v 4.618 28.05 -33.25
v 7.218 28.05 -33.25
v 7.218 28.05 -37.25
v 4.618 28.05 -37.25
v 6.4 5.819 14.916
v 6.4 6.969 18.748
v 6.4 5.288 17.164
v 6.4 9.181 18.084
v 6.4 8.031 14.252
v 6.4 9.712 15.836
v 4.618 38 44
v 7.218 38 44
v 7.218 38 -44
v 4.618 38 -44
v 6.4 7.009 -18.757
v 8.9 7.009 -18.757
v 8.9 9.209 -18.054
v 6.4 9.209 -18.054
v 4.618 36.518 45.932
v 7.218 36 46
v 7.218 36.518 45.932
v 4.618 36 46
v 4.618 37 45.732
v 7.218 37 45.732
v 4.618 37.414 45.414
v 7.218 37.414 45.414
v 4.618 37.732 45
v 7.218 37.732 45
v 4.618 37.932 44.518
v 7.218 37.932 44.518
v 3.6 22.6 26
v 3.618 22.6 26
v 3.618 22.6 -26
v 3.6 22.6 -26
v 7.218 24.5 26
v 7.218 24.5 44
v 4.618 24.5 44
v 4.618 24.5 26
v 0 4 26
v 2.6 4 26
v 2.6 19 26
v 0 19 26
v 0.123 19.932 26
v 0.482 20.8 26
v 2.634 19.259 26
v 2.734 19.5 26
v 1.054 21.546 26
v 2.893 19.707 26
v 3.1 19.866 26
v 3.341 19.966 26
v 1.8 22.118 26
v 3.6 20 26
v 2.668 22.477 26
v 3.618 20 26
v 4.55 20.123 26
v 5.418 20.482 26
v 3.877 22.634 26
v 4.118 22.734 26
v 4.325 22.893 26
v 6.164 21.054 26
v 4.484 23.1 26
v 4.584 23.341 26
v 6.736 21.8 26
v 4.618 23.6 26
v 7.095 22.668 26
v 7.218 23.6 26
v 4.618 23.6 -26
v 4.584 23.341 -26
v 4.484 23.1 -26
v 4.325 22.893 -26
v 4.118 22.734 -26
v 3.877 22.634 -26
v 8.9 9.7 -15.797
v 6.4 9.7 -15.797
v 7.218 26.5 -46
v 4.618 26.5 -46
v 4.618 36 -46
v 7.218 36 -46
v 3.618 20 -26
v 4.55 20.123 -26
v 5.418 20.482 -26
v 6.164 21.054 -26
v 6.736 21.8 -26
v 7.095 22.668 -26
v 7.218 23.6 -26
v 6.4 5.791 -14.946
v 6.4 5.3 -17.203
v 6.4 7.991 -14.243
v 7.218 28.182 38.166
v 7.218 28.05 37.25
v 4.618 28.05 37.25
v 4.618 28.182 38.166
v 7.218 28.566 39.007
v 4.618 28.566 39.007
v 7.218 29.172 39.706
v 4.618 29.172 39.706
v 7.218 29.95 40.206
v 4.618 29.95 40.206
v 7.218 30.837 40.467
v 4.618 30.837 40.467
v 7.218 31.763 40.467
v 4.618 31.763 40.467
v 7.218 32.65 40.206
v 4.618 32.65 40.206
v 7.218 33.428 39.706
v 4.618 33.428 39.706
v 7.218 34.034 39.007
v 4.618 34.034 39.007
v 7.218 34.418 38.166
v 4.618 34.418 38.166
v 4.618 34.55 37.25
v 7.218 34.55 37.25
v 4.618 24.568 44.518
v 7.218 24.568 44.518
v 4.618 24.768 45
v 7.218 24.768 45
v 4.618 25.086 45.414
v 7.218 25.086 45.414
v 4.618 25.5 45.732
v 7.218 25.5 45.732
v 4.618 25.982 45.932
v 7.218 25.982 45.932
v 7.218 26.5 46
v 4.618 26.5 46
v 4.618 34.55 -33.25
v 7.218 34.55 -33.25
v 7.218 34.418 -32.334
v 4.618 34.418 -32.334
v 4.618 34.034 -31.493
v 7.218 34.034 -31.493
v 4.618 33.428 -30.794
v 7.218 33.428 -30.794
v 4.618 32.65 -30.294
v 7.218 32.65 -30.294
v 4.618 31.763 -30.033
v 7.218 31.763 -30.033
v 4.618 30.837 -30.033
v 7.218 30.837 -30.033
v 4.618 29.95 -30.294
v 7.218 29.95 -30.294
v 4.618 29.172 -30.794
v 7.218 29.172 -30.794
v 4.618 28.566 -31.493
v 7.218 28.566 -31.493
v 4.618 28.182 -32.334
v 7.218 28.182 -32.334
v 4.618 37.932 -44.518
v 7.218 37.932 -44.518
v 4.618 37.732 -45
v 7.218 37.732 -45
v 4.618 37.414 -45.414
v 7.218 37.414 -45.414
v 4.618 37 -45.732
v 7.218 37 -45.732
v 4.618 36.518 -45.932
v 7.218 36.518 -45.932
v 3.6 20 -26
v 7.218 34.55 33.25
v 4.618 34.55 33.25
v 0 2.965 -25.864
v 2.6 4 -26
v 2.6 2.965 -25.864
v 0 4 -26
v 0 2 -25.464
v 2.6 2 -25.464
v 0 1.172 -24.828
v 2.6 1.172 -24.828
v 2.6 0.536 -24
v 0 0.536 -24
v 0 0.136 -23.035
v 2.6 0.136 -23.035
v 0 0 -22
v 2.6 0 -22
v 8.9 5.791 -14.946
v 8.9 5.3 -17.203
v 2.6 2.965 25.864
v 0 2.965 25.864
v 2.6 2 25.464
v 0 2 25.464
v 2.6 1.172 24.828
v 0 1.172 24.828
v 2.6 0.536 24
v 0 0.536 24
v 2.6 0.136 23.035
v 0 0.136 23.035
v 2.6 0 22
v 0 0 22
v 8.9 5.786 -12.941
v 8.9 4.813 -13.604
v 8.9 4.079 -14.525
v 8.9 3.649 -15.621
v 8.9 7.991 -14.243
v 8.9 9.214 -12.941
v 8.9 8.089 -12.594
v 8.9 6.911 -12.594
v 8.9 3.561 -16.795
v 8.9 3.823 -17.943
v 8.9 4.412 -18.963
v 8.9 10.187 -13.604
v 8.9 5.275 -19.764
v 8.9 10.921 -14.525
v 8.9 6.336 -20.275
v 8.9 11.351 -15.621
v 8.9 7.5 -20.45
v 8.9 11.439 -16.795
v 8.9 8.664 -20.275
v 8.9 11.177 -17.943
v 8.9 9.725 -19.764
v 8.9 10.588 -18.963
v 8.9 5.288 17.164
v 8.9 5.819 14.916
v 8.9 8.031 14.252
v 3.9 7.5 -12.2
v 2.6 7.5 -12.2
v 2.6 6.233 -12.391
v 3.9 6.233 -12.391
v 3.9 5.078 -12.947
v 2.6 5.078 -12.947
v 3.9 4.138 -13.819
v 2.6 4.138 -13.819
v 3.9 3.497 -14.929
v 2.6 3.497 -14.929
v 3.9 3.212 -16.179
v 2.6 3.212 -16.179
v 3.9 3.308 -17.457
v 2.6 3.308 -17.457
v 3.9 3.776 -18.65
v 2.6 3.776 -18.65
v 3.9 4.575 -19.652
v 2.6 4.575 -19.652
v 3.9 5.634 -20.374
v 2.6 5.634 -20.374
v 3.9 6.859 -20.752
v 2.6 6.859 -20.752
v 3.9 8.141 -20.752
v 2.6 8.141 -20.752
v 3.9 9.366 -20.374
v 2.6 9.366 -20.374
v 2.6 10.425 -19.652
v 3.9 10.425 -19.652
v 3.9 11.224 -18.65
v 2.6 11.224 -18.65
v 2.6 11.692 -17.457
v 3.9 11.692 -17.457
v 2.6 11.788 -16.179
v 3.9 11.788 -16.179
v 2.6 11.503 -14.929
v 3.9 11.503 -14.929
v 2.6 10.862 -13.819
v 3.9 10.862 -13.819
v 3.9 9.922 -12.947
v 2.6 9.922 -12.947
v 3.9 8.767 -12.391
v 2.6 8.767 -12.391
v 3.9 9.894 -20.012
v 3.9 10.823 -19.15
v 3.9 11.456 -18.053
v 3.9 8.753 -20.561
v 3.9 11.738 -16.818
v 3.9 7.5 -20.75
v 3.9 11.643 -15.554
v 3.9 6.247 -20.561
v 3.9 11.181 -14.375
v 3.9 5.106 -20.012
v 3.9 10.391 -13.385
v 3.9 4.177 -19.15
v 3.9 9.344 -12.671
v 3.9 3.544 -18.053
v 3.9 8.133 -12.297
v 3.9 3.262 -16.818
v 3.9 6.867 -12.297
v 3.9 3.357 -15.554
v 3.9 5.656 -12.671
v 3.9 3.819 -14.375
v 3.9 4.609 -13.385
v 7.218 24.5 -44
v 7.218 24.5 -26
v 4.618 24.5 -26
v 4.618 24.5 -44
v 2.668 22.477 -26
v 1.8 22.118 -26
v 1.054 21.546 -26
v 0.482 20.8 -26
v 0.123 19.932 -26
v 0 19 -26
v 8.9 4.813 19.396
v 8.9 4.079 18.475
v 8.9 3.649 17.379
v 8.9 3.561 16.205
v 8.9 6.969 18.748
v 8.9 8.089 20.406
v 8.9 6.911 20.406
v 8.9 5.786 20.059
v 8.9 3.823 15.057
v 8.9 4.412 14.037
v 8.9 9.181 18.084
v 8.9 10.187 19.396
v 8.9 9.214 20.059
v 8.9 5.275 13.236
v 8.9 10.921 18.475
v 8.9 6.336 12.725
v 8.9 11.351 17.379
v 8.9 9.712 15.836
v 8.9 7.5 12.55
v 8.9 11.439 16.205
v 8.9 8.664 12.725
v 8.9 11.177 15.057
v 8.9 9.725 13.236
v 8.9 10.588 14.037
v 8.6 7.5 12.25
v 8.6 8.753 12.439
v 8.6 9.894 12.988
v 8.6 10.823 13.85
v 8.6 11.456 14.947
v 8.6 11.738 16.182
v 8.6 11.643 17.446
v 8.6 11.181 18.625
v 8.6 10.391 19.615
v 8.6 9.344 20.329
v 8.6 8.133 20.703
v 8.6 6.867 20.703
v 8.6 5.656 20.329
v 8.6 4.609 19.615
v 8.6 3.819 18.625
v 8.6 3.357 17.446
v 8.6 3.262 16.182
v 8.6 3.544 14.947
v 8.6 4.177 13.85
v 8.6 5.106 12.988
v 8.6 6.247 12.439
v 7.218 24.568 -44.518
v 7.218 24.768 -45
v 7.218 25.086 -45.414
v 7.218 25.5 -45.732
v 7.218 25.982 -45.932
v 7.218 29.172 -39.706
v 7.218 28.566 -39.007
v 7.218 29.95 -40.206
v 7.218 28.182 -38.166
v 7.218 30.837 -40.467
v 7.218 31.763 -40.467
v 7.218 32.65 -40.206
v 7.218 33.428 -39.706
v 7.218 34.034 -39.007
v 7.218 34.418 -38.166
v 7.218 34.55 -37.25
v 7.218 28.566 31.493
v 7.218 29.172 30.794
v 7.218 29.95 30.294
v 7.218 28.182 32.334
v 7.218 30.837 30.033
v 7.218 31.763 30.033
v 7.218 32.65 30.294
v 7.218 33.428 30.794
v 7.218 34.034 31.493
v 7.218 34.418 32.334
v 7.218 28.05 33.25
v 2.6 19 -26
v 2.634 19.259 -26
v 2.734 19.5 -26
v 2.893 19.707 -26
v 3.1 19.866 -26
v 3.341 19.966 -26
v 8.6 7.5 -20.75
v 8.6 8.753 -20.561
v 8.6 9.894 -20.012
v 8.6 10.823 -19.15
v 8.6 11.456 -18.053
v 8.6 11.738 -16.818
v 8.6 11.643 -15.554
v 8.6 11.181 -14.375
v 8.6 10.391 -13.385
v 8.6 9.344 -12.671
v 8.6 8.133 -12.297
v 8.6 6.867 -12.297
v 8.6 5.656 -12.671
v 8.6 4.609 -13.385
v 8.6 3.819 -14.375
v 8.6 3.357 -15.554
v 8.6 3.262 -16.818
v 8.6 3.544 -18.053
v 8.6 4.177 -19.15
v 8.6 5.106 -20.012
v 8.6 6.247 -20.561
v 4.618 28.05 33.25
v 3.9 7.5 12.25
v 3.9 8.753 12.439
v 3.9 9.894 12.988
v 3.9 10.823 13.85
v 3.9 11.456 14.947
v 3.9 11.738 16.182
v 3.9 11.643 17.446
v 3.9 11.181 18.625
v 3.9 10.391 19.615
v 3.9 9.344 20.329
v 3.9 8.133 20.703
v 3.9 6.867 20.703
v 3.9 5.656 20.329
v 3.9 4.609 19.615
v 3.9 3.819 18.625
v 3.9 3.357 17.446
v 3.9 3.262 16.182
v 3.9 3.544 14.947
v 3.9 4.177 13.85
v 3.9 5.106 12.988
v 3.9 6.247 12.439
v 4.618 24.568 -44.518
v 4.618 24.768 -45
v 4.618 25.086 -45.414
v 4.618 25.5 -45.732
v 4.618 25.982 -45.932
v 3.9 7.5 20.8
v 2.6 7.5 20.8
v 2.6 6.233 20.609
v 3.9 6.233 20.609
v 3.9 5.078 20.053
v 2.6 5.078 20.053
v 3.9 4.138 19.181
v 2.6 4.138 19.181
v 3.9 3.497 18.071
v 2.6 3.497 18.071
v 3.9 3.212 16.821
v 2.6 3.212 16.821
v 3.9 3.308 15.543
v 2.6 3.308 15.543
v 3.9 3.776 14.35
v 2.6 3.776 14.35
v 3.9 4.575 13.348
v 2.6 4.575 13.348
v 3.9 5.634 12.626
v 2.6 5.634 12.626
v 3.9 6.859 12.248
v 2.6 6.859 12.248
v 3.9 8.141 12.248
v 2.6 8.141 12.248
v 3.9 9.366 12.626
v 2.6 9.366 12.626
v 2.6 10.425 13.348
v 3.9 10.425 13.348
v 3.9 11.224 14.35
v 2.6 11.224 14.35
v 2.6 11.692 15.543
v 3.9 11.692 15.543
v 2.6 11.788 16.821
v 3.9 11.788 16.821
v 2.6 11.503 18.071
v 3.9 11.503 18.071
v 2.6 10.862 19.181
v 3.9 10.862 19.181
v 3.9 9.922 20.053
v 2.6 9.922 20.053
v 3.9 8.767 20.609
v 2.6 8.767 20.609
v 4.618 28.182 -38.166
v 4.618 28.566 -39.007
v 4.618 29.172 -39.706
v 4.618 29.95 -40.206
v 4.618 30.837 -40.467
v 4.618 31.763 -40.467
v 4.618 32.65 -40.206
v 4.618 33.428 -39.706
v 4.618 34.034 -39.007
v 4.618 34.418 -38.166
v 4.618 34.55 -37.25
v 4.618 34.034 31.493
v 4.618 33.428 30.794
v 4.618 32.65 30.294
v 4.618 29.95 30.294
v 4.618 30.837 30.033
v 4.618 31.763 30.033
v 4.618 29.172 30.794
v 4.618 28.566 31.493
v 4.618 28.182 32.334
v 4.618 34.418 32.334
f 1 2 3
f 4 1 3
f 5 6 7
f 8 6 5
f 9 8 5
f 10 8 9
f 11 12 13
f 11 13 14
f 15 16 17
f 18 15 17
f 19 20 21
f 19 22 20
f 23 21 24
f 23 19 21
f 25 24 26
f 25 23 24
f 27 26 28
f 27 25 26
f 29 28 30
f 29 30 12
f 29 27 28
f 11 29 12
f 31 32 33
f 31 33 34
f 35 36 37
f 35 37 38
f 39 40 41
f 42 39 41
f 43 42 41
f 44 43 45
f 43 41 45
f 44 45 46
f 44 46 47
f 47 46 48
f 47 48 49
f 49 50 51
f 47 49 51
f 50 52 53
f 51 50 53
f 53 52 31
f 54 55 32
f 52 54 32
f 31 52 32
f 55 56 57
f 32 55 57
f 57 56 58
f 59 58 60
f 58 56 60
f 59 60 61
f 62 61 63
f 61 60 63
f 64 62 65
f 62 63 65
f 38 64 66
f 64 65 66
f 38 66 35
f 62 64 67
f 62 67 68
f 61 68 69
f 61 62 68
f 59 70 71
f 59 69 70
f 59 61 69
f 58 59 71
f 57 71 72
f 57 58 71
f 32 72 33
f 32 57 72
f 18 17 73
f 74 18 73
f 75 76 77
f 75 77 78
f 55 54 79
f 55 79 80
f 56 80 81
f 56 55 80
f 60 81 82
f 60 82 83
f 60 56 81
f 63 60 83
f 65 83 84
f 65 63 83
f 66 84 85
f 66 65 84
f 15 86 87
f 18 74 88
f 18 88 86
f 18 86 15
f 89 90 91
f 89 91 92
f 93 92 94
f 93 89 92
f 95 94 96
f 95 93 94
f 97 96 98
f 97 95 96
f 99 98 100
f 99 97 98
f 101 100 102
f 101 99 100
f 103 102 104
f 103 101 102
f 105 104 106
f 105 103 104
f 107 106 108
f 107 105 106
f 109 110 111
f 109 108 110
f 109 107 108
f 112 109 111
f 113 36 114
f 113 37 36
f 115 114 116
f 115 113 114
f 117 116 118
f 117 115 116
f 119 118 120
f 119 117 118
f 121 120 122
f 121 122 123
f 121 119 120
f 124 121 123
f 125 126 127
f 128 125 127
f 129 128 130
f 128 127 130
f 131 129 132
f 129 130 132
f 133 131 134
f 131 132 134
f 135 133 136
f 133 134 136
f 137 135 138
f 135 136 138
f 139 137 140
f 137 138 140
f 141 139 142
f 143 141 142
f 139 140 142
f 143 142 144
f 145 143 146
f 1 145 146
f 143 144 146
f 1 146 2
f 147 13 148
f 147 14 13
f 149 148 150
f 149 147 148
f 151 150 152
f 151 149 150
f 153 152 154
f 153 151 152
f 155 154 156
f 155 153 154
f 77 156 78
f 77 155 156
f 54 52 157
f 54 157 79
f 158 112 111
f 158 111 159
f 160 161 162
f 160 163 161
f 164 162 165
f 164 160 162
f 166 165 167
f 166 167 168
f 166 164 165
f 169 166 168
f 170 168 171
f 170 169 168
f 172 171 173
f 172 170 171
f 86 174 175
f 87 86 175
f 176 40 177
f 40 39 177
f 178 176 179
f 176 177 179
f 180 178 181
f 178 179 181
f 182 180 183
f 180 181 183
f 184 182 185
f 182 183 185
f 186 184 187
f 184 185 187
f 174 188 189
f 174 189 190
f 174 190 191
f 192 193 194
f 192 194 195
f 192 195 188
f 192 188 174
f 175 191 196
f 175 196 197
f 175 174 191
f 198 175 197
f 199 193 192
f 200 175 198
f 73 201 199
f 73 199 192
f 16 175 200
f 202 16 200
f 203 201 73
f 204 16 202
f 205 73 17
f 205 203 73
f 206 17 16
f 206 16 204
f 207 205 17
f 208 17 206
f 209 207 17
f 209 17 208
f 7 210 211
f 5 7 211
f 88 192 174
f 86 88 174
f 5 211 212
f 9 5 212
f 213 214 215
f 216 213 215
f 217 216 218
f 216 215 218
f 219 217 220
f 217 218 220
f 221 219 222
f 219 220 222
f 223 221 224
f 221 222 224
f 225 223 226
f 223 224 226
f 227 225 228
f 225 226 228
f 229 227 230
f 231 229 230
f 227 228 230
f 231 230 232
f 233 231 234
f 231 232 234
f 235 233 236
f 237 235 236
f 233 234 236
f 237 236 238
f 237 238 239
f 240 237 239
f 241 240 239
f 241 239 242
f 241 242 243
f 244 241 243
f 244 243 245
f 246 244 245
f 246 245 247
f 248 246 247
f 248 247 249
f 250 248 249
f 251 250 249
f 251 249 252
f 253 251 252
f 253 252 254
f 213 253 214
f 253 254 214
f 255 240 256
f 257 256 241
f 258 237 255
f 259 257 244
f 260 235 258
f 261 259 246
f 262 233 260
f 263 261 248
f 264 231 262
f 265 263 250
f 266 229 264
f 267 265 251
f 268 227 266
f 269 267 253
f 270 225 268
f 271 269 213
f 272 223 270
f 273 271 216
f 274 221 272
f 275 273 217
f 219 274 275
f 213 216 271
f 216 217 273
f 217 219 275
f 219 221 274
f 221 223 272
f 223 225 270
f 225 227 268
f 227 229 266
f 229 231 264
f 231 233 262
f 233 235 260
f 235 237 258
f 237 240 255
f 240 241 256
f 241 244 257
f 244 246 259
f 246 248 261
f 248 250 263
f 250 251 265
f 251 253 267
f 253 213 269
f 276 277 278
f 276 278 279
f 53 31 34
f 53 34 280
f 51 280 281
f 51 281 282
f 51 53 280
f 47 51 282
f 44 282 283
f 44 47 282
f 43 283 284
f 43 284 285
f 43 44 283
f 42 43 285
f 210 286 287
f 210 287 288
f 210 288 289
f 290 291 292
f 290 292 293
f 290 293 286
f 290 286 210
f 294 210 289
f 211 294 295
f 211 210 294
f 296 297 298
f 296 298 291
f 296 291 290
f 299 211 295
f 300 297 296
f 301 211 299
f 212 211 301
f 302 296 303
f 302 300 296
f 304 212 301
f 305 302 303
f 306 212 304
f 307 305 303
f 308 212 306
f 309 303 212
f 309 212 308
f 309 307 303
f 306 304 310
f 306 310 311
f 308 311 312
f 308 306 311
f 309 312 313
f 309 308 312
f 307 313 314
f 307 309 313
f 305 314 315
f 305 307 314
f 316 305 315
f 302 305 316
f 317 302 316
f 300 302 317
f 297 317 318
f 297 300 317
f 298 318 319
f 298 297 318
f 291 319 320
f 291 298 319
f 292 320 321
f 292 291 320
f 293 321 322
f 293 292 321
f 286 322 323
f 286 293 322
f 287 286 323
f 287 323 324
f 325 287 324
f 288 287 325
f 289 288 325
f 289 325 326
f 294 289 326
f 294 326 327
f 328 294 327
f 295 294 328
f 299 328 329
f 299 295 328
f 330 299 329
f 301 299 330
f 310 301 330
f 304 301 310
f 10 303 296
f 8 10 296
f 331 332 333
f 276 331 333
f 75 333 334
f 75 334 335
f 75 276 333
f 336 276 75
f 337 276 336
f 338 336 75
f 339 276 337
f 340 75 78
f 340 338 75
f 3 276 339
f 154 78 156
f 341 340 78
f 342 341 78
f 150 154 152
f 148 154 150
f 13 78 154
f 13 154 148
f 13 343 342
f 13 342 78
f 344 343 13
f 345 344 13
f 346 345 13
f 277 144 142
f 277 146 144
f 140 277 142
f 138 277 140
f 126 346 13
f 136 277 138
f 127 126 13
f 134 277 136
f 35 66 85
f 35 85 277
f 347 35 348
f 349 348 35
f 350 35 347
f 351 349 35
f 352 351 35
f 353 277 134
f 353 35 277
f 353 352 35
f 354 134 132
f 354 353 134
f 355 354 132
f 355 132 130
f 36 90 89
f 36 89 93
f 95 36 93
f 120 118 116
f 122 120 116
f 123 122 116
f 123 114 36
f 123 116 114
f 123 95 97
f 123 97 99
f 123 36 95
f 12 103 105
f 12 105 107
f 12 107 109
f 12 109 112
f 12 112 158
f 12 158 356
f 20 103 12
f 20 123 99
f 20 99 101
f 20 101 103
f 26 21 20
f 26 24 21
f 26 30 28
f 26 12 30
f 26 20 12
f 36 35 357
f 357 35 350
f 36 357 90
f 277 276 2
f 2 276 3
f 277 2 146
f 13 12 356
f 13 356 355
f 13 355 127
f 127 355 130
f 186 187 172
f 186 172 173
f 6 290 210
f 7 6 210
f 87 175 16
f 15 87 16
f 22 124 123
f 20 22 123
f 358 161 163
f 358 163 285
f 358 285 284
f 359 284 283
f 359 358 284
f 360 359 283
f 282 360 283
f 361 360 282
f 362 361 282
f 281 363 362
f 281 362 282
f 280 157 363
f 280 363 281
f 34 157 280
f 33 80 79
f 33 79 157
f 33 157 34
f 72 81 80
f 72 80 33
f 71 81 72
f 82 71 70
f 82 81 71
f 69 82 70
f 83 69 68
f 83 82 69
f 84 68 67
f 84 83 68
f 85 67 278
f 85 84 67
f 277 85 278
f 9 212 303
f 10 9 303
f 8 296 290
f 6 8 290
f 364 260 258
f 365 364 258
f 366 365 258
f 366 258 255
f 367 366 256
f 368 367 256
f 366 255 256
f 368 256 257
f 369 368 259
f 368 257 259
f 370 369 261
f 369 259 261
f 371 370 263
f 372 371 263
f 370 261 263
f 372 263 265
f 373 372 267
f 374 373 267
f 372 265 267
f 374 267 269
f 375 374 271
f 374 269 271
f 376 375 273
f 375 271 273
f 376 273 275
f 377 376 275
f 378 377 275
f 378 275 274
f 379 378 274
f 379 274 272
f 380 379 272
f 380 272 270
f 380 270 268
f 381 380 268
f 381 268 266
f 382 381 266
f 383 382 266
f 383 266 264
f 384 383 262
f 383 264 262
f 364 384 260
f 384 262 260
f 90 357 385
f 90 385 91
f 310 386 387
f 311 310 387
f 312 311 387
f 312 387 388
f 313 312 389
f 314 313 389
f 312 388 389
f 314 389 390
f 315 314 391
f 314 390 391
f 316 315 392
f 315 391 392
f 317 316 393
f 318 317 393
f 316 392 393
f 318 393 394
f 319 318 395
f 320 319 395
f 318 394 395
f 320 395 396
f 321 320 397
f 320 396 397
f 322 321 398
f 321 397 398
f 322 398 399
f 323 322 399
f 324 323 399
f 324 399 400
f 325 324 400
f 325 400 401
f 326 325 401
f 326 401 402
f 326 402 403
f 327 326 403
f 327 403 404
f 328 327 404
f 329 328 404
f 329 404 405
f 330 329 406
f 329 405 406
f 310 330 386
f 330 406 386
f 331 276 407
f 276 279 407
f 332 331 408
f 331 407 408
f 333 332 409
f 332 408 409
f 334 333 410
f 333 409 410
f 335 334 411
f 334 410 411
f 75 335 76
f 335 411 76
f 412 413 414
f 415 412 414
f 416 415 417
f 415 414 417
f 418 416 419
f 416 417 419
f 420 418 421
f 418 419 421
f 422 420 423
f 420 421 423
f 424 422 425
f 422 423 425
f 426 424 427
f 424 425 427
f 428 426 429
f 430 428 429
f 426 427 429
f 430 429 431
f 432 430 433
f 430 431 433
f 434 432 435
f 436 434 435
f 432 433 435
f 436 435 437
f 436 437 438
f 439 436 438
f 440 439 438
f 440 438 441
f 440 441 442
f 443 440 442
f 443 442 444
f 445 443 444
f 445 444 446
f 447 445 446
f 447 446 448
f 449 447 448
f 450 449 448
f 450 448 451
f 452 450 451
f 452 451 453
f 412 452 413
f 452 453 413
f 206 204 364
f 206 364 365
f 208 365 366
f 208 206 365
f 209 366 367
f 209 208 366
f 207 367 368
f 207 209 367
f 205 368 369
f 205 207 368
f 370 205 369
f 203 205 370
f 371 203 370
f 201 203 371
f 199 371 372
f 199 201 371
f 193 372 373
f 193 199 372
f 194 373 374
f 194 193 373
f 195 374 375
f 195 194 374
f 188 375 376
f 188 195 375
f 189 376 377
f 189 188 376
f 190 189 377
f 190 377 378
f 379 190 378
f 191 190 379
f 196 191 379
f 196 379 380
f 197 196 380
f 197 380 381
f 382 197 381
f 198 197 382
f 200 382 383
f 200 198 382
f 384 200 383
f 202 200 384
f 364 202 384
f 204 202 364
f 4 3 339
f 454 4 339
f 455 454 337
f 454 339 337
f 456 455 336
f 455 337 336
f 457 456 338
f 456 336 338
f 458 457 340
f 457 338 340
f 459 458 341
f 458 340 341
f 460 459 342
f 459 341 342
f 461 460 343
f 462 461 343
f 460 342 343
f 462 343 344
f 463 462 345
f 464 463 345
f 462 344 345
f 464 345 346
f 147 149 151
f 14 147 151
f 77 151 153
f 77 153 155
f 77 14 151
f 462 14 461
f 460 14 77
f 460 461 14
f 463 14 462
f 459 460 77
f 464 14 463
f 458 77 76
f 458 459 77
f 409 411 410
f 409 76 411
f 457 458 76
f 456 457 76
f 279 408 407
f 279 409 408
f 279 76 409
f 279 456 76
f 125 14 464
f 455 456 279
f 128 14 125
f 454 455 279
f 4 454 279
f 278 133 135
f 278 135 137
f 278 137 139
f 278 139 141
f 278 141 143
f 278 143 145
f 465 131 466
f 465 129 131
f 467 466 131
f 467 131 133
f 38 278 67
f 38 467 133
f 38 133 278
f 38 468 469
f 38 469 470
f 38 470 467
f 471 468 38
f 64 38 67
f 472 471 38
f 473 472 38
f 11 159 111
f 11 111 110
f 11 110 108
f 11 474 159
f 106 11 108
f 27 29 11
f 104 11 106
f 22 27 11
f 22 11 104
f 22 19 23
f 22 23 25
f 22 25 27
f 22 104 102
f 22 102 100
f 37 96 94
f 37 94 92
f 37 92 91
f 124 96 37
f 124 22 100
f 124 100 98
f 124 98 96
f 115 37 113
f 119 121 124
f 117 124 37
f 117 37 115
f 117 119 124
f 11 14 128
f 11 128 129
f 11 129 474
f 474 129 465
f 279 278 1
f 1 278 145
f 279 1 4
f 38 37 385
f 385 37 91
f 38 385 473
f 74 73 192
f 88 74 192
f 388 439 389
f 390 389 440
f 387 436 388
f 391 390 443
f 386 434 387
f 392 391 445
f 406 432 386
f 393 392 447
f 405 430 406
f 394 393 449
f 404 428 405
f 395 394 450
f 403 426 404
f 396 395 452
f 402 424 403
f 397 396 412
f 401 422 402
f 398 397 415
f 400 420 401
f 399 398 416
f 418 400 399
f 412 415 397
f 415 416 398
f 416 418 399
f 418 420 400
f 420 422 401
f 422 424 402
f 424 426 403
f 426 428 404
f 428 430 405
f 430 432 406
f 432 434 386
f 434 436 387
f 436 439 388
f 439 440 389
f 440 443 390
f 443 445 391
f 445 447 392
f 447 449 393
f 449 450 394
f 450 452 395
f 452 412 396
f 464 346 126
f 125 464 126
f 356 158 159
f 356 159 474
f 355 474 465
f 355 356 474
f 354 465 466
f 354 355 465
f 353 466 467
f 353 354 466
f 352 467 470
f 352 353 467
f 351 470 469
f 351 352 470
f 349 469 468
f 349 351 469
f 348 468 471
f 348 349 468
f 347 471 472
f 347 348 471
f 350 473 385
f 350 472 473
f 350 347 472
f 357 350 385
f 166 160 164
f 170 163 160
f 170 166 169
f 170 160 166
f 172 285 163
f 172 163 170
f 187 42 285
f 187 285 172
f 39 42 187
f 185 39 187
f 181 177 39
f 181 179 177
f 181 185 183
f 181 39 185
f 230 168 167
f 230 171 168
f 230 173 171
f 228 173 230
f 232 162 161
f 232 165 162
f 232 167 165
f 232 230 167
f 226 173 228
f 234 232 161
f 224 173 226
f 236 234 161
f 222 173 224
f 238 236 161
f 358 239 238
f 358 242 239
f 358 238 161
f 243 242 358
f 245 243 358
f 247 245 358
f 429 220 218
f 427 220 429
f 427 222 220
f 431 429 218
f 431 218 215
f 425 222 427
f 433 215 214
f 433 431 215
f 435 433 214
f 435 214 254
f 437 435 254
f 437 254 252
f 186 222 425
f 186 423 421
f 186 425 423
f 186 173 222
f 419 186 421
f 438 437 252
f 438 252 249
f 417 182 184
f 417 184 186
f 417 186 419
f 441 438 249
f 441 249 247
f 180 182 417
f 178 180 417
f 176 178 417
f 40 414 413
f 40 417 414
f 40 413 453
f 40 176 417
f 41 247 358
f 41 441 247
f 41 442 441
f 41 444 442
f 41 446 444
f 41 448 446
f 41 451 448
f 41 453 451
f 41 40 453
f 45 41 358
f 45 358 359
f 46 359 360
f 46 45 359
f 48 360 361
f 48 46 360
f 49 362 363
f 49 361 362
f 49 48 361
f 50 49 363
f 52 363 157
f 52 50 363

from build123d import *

# Parameters (mm, degrees)
BOSS_EXTRUDE1_DEPTH = 46
CUT_EXTRUDE1_REACH  = 62.101
SKETCH2_W           = 20
SKETCH2_H           = 24.5
FILLET1_R           = 2
FILLET2_R           = 4
CUT_EXTRUDE2_REACH  = 62.101
SKETCH4_R           = 4.3
BOSS_EXTRUDE2_DEPTH = 1.3
SKETCH5_R           = 4.25
BOSS_EXTRUDE3_DEPTH = 5
CHAMFER1_SIZE       = 0.3
CUT_EXTRUDE3_DEPTH  = 2.5


with BuildPart() as part:
    # Sketch1 → Boss-Extrude1 (new, symmetric)
    with BuildSketch(Plane.XY):
        with BuildLine():
            Line((0, 0), (2.6, 0))
            Line((2.6, 0), (2.6, 19))
            ThreePointArc((2.6, 19), (2.892893219, 19.707106781), (3.6, 20))
            Line((3.6, 20), (3.618034897, 20))
            ThreePointArc((3.618034897, 20), (6.16361931, 21.054415588), (7.218034897, 23.6))
            Line((7.218034897, 23.6), (7.218034897, 38))
            Line((7.218034897, 38), (4.618034897, 38))
            Line((4.618034897, 38), (4.618034897, 23.6))
            ThreePointArc((4.618034897, 23.6), (4.325141678, 22.892893219), (3.618034897, 22.6))
            Line((3.618034897, 22.6), (3.6, 22.6))
            ThreePointArc((3.6, 22.6), (1.054415588, 21.545584412), (0, 19))
            Line((0, 19), (0, 0))
        make_face()
    extrude(amount=BOSS_EXTRUDE1_DEPTH, both=True)

    # Sketch2 → Cut-Extrude1 (cut, up to next)
    with BuildSketch(Plane(origin=(7.218034897, 0, 0), x_dir=(0, 0, -1), z_dir=(1, 0, 0)), mode=Mode.PRIVATE) as cut_extrude1_sk1:
        with Locations((-36, 12.25)):
            Rectangle(SKETCH2_W, SKETCH2_H)
    cut_extrude1_tool1 = extrude(cut_extrude1_sk1.sketch, amount=-CUT_EXTRUDE1_REACH, mode=Mode.PRIVATE) & part.part
    # Sketch2 → Cut-Extrude1 (cut, up to next)
    with BuildSketch(Plane(origin=(7.218034897, 0, 0), x_dir=(0, 0, -1), z_dir=(1, 0, 0)), mode=Mode.PRIVATE) as cut_extrude1_sk2:
        with Locations((36, 12.25)):
            Rectangle(SKETCH2_W, SKETCH2_H)
    cut_extrude1_tool2 = extrude(cut_extrude1_sk2.sketch, amount=-CUT_EXTRUDE1_REACH, mode=Mode.PRIVATE) & part.part
    add(cut_extrude1_tool1.solids().sort_by_distance((7.218035, 12.25, 36))[0], mode=Mode.SUBTRACT)
    add(cut_extrude1_tool2.solids().sort_by_distance((7.218035, 12.25, -36))[0], mode=Mode.SUBTRACT)

    # Fillet1
    fillet1_edges = [part.edges().sort_by_distance(p)[0] for p in [
        (5.918034897, 38, -46),
        (5.918034897, 38, 46),
        (5.918034897, 24.5, 46),
        (5.918034897, 24.5, -46),
    ]]
    fillet(fillet1_edges, radius=FILLET1_R)

    # Fillet2
    fillet2_edges = [part.edges().sort_by_distance(p)[0] for p in [
        (1.3, 0, 26),
        (1.3, 0, -26),
    ]]
    fillet(fillet2_edges, radius=FILLET2_R)

    # Sketch3 → Cut-Extrude2 (cut, up to next)
    with BuildSketch(Plane(origin=(7.218034897, 0, 0), x_dir=(0, 0, -1), z_dir=(1, 0, 0)), mode=Mode.PRIVATE) as cut_extrude2_sk1:
        with BuildLine():
            Line((-37.25, 34.55), (-33.25, 34.55))
            ThreePointArc((-33.25, 34.55), (-30, 31.3), (-33.25, 28.05))
            Line((-33.25, 28.05), (-37.25, 28.05))
            ThreePointArc((-37.25, 28.05), (-40.5, 31.3), (-37.25, 34.55))
        make_face()
    cut_extrude2_tool1 = extrude(cut_extrude2_sk1.sketch, amount=-CUT_EXTRUDE2_REACH, mode=Mode.PRIVATE) & part.part
    # Sketch3 → Cut-Extrude2 (cut, up to next)
    with BuildSketch(Plane(origin=(7.218034897, 0, 0), x_dir=(0, 0, -1), z_dir=(1, 0, 0)), mode=Mode.PRIVATE) as cut_extrude2_sk2:
        with BuildLine():
            Line((37.25, 34.55), (33.25, 34.55))
            ThreePointArc((33.25, 34.55), (30, 31.3), (33.25, 28.05))
            Line((33.25, 28.05), (37.25, 28.05))
            ThreePointArc((37.25, 28.05), (40.5, 31.3), (37.25, 34.55))
        make_face()
    cut_extrude2_tool2 = extrude(cut_extrude2_sk2.sketch, amount=-CUT_EXTRUDE2_REACH, mode=Mode.PRIVATE) & part.part
    add(cut_extrude2_tool1.solids().sort_by_distance((7.218035, 31.3, 35.25))[0], mode=Mode.SUBTRACT)
    add(cut_extrude2_tool2.solids().sort_by_distance((7.218035, 31.3, -35.25))[0], mode=Mode.SUBTRACT)

    # Sketch4 → Boss-Extrude2 (add)
    with BuildSketch(Plane(origin=(2.6, 0, 0), x_dir=(0, 0, -1), z_dir=(1, 0, 0))):
        with Locations(Location((-16.5, 7.5, 0), (0, 0, 180))):
            Circle(SKETCH4_R)
        with Locations(Location((16.5, 7.5, 0), (0, 0, 180))):
            Circle(SKETCH4_R)
    extrude(amount=BOSS_EXTRUDE2_DEPTH)

    # Sketch5 → Boss-Extrude3 (add)
    with BuildSketch(Plane(origin=(3.9, 0, 0), x_dir=(0, 0, -1), z_dir=(1, 0, 0))):
        with Locations((-16.5, 7.5)):
            Circle(SKETCH5_R)
        with Locations((16.5, 7.5)):
            Circle(SKETCH5_R)
    extrude(amount=BOSS_EXTRUDE3_DEPTH)

    # Chamfer1
    chamfer1_edges = [part.edges().sort_by_distance(p)[0] for p in [
        (8.9, 7.5, 20.75),
        (8.9, 7.5, -12.25),
    ]]
    chamfer(chamfer1_edges, length=CHAMFER1_SIZE)

    # Sketch6 → Cut-Extrude3 (cut)
    with BuildSketch(Plane(origin=(8.9, 0, 0), x_dir=(0, 0, -1), z_dir=(1, 0, 0))):
        Polygon((-14.916307537, 5.819151549), (-14.25249631, 8.03109368), (-15.836188773, 9.711942131), (-18.083692463, 9.180848451), (-18.74750369, 6.96890632), (-17.163811227, 5.288057869), align=None)
        Polygon((14.946369576, 5.791326293), (17.202939625, 5.300179731), (18.756570049, 7.008853438), (18.053630424, 9.208673707), (15.797060375, 9.699820269), (14.243429951, 7.991146562), align=None)
    extrude(amount=-CUT_EXTRUDE3_DEPTH, mode=Mode.SUBTRACT)


solid = part.part
